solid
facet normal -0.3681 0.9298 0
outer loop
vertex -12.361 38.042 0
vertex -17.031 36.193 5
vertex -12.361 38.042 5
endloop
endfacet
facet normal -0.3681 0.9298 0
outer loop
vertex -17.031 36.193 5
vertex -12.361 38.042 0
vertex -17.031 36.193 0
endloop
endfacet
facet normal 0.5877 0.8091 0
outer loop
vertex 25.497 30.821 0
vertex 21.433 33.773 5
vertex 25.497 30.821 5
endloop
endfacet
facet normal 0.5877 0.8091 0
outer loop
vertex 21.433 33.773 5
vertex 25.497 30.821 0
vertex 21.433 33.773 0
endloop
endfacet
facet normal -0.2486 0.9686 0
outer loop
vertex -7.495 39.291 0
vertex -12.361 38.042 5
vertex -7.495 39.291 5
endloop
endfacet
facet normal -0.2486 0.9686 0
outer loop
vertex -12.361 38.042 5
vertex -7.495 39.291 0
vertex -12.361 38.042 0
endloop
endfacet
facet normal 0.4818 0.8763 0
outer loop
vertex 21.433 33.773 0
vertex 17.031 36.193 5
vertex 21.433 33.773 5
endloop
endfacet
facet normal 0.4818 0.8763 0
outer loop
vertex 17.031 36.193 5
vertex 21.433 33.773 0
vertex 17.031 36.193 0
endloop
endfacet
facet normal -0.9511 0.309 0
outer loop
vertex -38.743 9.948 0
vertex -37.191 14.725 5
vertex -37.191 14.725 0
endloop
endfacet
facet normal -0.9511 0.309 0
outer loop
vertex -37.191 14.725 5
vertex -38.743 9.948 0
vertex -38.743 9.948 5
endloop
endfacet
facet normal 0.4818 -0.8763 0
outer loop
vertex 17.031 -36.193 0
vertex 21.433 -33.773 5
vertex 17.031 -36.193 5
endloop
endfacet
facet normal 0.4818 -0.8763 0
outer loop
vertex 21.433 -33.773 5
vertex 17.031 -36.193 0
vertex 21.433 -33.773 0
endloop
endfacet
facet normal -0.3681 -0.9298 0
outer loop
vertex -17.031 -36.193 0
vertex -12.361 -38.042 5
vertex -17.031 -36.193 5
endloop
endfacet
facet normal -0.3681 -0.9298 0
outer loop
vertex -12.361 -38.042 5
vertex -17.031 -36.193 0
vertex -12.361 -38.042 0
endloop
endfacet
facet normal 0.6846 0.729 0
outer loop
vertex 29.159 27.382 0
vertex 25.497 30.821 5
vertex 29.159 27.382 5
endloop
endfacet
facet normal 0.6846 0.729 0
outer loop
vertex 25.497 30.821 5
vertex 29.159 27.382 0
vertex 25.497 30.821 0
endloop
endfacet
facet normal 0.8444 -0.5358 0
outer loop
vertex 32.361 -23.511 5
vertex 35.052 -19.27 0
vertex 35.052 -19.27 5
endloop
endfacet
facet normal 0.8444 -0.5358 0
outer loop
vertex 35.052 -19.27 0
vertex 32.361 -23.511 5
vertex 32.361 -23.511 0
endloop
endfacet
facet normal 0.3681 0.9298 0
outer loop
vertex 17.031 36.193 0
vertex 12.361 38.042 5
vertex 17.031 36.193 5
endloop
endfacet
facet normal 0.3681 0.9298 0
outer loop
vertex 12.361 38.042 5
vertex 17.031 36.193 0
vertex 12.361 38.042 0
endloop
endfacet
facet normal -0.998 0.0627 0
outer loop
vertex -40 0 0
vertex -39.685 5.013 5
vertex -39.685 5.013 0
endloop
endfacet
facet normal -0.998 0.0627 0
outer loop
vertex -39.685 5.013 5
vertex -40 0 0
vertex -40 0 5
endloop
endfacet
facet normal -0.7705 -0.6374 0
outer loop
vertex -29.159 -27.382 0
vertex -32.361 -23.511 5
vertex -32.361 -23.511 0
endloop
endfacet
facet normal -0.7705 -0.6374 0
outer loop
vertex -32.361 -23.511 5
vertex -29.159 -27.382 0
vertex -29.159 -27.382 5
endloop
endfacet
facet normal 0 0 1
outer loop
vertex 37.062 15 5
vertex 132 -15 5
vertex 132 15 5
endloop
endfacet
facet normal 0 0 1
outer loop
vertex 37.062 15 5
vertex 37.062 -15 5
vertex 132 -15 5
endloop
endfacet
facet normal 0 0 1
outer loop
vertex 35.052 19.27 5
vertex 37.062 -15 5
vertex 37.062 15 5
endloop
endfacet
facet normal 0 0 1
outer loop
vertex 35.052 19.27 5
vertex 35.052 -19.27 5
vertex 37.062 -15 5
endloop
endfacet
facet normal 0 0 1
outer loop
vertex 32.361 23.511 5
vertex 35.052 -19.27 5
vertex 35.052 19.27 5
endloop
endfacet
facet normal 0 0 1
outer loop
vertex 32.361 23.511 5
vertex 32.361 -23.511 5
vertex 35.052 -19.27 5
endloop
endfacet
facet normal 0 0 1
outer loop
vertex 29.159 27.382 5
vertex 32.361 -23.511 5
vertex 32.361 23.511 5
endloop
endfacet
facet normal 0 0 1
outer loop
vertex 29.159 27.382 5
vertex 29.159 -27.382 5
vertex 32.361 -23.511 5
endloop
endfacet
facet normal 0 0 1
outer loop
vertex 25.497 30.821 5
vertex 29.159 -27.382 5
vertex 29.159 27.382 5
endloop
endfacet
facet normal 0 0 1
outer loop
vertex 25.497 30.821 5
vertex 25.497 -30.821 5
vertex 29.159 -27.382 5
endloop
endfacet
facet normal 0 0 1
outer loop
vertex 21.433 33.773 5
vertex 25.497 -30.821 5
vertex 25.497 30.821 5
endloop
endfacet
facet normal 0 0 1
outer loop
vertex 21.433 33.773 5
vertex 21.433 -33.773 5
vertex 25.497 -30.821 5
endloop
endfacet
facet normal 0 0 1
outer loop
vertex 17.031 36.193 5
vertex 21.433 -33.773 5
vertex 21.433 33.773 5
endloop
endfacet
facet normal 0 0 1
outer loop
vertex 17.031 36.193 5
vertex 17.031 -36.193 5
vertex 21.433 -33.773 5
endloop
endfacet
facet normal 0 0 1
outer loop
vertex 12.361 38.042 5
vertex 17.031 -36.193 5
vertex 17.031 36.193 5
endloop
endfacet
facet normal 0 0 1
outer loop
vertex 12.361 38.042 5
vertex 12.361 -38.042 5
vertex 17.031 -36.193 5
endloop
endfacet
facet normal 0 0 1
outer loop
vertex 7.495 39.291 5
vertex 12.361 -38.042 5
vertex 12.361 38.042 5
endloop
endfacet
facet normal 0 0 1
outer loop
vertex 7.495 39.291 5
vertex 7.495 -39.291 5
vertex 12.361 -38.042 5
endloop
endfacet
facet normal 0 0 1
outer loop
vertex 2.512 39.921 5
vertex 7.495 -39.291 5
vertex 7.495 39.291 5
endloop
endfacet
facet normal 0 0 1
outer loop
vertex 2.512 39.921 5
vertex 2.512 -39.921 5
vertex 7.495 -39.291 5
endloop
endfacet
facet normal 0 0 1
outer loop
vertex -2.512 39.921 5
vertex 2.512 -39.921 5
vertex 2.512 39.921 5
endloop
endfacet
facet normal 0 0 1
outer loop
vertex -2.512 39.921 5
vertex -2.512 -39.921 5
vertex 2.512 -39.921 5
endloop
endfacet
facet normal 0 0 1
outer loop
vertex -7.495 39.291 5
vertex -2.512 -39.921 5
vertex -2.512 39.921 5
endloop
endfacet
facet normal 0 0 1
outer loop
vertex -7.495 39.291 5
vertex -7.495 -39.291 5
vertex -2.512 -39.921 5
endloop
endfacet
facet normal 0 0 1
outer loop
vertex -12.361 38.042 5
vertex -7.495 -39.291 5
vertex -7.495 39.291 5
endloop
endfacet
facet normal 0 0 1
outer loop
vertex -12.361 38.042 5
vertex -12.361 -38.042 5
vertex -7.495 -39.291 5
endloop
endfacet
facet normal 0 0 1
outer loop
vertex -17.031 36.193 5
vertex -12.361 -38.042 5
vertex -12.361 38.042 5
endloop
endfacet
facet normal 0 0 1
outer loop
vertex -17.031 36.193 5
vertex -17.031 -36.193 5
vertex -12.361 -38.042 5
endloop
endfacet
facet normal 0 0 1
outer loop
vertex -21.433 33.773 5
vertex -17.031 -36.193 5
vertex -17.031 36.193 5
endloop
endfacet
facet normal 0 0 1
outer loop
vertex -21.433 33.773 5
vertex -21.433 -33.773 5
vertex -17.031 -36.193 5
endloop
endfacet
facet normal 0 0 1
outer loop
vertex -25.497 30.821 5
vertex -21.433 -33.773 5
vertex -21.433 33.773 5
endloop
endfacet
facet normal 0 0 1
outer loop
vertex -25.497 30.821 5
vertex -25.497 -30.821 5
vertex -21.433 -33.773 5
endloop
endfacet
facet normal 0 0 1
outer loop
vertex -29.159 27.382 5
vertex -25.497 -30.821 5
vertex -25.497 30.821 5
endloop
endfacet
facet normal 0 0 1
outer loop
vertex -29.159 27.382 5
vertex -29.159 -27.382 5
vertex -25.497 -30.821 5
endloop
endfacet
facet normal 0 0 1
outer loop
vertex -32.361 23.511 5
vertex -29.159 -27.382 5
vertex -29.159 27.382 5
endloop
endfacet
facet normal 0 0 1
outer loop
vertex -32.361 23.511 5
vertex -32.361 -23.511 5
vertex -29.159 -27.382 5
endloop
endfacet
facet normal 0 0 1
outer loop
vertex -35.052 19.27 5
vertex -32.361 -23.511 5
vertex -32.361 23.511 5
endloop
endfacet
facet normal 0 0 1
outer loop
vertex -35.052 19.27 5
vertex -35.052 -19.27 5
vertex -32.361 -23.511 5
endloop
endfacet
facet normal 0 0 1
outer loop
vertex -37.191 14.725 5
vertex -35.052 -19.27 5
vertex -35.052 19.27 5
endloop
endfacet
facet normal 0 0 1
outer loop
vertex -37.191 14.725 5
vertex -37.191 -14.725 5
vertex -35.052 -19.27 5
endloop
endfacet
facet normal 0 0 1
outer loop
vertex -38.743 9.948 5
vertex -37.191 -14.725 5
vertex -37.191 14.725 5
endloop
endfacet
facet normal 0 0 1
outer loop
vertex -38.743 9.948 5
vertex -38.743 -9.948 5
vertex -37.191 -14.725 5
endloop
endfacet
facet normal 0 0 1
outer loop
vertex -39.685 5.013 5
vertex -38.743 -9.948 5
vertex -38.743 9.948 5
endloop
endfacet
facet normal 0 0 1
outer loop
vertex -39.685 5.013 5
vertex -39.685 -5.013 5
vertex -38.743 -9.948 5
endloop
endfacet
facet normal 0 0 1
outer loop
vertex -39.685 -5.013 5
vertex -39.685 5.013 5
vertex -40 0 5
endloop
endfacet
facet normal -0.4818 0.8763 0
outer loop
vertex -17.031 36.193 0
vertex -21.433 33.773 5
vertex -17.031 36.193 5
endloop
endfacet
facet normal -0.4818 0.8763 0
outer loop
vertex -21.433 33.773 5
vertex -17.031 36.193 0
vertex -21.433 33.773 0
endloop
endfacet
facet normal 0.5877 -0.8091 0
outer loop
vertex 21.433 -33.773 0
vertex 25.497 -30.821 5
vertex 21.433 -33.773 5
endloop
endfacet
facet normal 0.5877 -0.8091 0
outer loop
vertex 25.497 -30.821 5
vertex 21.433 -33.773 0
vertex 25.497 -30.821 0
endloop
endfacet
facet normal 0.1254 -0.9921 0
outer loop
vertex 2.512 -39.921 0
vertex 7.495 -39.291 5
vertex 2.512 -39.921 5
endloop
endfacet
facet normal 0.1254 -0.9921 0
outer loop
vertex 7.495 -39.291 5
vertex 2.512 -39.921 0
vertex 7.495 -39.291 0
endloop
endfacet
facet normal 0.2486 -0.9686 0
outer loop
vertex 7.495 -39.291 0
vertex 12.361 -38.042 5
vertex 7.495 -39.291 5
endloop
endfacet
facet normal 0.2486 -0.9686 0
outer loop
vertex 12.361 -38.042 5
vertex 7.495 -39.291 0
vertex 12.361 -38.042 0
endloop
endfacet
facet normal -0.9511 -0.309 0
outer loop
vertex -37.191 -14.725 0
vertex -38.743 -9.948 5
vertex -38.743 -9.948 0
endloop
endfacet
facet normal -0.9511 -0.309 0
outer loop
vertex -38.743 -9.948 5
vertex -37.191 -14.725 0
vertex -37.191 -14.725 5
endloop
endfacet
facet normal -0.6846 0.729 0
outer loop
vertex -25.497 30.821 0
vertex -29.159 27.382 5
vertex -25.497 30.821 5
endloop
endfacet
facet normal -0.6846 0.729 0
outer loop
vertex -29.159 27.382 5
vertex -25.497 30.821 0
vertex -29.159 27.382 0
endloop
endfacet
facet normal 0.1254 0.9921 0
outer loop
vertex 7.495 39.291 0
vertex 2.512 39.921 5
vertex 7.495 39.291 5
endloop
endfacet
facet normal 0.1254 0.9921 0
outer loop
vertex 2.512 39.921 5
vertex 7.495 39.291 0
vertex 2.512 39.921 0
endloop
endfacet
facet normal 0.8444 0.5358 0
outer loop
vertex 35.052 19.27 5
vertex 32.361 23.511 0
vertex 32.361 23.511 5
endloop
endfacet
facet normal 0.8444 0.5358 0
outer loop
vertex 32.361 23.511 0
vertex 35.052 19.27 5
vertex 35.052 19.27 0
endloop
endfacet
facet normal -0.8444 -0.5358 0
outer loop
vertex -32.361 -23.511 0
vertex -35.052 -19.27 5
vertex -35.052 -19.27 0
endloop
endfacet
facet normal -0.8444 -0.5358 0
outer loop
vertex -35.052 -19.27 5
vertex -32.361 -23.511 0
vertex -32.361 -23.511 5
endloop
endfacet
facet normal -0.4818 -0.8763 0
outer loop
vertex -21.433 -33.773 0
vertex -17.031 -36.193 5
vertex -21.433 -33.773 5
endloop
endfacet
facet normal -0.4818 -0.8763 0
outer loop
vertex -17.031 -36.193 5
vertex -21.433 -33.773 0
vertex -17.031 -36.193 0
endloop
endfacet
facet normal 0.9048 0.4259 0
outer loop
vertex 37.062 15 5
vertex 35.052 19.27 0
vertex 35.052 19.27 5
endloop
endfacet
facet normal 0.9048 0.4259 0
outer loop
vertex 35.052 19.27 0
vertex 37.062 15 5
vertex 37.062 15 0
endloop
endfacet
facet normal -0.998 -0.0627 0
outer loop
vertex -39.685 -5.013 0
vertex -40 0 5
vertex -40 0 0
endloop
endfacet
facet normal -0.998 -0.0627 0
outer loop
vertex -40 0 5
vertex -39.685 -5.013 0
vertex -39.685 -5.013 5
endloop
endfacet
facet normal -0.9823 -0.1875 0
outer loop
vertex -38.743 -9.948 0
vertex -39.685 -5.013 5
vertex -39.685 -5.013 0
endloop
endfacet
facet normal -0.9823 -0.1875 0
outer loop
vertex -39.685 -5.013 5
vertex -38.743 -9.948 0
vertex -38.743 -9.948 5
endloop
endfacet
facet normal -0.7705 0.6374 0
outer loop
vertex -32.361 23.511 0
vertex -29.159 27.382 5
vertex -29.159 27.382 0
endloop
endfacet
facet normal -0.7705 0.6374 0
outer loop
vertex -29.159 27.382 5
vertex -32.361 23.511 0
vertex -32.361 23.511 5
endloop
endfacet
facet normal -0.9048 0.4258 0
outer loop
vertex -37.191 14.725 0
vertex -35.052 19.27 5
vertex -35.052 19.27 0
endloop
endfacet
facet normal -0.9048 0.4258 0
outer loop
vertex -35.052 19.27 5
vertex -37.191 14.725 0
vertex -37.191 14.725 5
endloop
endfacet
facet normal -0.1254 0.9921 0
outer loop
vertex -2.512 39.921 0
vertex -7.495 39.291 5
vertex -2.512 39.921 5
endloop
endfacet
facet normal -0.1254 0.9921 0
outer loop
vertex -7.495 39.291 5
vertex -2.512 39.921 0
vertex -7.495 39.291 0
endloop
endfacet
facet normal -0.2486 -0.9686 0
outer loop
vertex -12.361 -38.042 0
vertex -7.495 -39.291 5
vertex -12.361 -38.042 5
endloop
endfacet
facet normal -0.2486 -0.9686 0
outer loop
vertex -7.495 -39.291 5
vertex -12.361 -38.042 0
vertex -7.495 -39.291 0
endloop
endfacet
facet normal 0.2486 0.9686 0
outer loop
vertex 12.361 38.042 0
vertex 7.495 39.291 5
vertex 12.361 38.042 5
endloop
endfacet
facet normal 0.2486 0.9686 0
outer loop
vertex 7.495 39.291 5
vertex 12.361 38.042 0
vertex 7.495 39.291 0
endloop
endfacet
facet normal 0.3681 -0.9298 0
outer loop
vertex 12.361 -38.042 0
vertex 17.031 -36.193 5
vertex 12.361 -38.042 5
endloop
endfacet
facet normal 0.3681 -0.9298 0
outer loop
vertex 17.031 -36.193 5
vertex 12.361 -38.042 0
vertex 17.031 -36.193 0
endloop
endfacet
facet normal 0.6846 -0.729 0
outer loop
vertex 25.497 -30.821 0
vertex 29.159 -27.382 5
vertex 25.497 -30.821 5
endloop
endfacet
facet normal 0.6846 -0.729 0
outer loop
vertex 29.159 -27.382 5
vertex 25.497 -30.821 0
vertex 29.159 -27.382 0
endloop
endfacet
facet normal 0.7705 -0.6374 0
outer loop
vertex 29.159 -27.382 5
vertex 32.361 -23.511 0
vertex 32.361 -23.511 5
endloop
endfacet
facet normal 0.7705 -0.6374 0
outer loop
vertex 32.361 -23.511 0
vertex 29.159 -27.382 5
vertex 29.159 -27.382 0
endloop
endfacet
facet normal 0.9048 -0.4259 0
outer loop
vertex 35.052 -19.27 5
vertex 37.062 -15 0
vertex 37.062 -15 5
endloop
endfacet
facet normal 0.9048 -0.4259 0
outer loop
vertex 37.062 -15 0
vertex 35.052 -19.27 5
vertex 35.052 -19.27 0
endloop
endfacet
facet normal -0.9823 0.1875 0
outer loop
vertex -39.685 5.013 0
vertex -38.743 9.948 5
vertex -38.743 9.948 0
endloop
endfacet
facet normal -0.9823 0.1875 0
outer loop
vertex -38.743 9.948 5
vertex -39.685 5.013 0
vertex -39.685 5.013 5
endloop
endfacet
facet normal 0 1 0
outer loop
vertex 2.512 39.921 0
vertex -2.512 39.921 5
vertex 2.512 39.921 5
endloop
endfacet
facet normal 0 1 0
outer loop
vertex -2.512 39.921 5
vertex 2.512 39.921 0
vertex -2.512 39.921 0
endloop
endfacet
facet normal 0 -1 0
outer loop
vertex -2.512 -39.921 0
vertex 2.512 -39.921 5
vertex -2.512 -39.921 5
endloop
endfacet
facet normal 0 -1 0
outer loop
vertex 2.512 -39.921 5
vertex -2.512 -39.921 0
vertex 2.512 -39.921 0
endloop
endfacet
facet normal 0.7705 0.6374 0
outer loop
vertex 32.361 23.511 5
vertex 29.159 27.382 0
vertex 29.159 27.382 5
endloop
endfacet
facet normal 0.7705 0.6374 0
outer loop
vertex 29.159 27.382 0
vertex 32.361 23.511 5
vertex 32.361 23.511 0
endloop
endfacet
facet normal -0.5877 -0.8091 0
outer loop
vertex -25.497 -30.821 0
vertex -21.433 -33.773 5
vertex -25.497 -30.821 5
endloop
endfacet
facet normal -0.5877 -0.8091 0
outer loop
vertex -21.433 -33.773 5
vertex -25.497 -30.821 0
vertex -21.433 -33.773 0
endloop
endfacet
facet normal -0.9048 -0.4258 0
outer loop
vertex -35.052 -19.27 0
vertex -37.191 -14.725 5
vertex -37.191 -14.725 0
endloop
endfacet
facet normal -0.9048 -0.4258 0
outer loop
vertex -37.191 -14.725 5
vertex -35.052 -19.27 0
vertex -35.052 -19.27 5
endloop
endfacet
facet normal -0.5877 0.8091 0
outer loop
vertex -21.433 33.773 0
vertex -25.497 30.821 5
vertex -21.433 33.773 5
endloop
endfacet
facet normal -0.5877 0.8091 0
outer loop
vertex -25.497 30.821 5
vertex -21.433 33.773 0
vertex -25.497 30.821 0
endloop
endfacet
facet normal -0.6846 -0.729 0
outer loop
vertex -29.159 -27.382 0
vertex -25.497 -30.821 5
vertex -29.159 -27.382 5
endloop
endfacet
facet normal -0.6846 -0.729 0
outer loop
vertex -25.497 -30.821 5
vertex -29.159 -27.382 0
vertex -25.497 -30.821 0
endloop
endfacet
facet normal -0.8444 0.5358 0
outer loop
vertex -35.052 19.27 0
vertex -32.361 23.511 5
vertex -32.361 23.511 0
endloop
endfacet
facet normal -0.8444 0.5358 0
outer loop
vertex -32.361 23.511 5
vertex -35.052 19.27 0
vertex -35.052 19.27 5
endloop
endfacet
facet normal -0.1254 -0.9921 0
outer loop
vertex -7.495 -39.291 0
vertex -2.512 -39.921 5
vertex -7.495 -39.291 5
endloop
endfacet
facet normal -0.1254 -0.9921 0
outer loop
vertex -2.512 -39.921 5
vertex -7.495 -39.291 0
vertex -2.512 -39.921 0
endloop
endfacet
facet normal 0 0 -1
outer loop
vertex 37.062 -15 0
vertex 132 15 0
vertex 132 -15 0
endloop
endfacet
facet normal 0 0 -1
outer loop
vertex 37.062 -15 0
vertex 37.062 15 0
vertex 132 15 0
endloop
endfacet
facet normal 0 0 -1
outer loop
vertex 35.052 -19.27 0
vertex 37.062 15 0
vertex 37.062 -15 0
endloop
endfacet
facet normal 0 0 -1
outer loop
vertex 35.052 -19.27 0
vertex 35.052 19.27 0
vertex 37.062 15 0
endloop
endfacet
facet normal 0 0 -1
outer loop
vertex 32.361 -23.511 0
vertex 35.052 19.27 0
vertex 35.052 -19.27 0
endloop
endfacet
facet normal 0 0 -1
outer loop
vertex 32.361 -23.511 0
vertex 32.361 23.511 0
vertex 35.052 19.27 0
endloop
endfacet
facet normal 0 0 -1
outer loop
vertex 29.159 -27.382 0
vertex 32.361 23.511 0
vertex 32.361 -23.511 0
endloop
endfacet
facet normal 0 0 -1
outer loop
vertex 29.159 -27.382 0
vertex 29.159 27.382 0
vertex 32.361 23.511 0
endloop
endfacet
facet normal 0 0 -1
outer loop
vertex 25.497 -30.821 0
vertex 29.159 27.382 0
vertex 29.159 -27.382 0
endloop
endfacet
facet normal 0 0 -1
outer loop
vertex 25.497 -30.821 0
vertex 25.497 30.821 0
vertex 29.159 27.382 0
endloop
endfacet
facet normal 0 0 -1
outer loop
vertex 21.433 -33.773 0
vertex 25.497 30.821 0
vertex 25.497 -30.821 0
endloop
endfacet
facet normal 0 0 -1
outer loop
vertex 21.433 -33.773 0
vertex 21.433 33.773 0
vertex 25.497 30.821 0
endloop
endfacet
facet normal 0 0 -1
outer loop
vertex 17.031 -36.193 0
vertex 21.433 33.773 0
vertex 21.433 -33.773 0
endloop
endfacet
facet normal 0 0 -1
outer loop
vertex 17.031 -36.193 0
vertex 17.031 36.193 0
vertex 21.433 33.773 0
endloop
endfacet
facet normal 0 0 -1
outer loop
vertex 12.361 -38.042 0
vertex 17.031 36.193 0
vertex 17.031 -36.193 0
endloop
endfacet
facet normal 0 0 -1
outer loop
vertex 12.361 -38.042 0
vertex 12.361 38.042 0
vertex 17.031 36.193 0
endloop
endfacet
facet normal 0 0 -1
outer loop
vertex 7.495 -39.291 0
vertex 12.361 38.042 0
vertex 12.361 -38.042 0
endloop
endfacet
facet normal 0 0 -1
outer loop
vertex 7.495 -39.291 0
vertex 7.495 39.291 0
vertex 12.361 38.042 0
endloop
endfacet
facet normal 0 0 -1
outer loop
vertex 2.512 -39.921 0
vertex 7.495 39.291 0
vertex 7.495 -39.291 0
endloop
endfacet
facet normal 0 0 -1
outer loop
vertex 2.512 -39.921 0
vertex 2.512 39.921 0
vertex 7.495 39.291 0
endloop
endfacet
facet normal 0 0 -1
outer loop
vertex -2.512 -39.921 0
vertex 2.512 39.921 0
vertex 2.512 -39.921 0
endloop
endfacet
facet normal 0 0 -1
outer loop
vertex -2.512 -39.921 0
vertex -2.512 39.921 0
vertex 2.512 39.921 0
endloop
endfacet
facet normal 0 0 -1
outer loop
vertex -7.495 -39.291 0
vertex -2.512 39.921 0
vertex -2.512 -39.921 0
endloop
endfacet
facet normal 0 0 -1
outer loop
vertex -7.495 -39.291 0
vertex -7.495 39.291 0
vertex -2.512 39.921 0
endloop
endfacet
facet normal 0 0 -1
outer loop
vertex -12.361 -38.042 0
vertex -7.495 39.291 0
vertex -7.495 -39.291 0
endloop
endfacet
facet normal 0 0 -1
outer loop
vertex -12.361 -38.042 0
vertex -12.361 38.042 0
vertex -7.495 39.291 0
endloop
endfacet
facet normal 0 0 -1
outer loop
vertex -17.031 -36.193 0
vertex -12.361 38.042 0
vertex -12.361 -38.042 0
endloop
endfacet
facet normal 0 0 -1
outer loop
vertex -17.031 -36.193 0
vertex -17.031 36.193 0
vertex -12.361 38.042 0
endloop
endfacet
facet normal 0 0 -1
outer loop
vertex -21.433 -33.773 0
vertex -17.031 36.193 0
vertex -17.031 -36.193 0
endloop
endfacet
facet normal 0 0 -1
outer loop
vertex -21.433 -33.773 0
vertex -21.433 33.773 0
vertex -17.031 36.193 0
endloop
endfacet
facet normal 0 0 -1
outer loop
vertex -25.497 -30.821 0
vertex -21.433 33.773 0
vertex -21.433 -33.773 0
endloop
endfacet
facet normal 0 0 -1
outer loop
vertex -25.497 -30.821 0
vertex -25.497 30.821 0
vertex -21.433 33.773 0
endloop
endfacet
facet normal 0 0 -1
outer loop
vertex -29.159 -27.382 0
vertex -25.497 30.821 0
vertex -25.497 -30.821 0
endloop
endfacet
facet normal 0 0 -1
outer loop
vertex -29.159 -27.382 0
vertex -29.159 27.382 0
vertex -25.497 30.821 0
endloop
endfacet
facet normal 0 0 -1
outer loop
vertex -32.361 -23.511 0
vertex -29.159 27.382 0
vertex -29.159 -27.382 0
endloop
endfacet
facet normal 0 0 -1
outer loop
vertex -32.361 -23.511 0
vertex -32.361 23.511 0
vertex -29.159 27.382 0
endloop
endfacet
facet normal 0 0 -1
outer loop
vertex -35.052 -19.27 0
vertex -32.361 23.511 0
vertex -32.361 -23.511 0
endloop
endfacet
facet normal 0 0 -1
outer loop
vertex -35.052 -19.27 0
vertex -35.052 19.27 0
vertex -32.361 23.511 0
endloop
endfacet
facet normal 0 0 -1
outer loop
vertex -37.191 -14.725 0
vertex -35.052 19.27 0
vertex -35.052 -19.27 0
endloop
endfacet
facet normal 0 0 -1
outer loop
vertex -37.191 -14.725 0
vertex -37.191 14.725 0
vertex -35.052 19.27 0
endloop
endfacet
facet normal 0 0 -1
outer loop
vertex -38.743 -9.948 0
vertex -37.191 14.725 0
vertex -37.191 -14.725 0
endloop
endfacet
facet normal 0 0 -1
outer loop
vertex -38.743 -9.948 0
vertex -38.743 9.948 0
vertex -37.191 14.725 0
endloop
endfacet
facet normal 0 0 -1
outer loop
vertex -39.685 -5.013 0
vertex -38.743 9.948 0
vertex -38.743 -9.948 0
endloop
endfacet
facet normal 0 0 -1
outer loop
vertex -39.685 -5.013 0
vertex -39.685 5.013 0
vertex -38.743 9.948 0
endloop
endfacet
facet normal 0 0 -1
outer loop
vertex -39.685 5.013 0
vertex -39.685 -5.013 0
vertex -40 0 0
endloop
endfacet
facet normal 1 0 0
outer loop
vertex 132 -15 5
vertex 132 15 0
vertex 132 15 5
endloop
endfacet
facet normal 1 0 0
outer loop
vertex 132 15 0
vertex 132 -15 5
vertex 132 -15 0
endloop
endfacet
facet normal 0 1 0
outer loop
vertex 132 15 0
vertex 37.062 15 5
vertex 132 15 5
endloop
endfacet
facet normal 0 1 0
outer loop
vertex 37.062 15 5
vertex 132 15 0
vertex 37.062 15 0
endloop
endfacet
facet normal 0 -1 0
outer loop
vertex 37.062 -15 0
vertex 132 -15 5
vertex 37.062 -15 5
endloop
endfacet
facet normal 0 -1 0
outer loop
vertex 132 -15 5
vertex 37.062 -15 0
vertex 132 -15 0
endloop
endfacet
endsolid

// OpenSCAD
$fn=50;
target_size=80;
target_thickness=5;
bottom_length=100;
difference()
{
union()
{
cylinder(h=target_thickness,r=target_size/2);
translate([target_size/2.5,-15,0])cube([bottom_length,30,target_thickness]);
}
}
